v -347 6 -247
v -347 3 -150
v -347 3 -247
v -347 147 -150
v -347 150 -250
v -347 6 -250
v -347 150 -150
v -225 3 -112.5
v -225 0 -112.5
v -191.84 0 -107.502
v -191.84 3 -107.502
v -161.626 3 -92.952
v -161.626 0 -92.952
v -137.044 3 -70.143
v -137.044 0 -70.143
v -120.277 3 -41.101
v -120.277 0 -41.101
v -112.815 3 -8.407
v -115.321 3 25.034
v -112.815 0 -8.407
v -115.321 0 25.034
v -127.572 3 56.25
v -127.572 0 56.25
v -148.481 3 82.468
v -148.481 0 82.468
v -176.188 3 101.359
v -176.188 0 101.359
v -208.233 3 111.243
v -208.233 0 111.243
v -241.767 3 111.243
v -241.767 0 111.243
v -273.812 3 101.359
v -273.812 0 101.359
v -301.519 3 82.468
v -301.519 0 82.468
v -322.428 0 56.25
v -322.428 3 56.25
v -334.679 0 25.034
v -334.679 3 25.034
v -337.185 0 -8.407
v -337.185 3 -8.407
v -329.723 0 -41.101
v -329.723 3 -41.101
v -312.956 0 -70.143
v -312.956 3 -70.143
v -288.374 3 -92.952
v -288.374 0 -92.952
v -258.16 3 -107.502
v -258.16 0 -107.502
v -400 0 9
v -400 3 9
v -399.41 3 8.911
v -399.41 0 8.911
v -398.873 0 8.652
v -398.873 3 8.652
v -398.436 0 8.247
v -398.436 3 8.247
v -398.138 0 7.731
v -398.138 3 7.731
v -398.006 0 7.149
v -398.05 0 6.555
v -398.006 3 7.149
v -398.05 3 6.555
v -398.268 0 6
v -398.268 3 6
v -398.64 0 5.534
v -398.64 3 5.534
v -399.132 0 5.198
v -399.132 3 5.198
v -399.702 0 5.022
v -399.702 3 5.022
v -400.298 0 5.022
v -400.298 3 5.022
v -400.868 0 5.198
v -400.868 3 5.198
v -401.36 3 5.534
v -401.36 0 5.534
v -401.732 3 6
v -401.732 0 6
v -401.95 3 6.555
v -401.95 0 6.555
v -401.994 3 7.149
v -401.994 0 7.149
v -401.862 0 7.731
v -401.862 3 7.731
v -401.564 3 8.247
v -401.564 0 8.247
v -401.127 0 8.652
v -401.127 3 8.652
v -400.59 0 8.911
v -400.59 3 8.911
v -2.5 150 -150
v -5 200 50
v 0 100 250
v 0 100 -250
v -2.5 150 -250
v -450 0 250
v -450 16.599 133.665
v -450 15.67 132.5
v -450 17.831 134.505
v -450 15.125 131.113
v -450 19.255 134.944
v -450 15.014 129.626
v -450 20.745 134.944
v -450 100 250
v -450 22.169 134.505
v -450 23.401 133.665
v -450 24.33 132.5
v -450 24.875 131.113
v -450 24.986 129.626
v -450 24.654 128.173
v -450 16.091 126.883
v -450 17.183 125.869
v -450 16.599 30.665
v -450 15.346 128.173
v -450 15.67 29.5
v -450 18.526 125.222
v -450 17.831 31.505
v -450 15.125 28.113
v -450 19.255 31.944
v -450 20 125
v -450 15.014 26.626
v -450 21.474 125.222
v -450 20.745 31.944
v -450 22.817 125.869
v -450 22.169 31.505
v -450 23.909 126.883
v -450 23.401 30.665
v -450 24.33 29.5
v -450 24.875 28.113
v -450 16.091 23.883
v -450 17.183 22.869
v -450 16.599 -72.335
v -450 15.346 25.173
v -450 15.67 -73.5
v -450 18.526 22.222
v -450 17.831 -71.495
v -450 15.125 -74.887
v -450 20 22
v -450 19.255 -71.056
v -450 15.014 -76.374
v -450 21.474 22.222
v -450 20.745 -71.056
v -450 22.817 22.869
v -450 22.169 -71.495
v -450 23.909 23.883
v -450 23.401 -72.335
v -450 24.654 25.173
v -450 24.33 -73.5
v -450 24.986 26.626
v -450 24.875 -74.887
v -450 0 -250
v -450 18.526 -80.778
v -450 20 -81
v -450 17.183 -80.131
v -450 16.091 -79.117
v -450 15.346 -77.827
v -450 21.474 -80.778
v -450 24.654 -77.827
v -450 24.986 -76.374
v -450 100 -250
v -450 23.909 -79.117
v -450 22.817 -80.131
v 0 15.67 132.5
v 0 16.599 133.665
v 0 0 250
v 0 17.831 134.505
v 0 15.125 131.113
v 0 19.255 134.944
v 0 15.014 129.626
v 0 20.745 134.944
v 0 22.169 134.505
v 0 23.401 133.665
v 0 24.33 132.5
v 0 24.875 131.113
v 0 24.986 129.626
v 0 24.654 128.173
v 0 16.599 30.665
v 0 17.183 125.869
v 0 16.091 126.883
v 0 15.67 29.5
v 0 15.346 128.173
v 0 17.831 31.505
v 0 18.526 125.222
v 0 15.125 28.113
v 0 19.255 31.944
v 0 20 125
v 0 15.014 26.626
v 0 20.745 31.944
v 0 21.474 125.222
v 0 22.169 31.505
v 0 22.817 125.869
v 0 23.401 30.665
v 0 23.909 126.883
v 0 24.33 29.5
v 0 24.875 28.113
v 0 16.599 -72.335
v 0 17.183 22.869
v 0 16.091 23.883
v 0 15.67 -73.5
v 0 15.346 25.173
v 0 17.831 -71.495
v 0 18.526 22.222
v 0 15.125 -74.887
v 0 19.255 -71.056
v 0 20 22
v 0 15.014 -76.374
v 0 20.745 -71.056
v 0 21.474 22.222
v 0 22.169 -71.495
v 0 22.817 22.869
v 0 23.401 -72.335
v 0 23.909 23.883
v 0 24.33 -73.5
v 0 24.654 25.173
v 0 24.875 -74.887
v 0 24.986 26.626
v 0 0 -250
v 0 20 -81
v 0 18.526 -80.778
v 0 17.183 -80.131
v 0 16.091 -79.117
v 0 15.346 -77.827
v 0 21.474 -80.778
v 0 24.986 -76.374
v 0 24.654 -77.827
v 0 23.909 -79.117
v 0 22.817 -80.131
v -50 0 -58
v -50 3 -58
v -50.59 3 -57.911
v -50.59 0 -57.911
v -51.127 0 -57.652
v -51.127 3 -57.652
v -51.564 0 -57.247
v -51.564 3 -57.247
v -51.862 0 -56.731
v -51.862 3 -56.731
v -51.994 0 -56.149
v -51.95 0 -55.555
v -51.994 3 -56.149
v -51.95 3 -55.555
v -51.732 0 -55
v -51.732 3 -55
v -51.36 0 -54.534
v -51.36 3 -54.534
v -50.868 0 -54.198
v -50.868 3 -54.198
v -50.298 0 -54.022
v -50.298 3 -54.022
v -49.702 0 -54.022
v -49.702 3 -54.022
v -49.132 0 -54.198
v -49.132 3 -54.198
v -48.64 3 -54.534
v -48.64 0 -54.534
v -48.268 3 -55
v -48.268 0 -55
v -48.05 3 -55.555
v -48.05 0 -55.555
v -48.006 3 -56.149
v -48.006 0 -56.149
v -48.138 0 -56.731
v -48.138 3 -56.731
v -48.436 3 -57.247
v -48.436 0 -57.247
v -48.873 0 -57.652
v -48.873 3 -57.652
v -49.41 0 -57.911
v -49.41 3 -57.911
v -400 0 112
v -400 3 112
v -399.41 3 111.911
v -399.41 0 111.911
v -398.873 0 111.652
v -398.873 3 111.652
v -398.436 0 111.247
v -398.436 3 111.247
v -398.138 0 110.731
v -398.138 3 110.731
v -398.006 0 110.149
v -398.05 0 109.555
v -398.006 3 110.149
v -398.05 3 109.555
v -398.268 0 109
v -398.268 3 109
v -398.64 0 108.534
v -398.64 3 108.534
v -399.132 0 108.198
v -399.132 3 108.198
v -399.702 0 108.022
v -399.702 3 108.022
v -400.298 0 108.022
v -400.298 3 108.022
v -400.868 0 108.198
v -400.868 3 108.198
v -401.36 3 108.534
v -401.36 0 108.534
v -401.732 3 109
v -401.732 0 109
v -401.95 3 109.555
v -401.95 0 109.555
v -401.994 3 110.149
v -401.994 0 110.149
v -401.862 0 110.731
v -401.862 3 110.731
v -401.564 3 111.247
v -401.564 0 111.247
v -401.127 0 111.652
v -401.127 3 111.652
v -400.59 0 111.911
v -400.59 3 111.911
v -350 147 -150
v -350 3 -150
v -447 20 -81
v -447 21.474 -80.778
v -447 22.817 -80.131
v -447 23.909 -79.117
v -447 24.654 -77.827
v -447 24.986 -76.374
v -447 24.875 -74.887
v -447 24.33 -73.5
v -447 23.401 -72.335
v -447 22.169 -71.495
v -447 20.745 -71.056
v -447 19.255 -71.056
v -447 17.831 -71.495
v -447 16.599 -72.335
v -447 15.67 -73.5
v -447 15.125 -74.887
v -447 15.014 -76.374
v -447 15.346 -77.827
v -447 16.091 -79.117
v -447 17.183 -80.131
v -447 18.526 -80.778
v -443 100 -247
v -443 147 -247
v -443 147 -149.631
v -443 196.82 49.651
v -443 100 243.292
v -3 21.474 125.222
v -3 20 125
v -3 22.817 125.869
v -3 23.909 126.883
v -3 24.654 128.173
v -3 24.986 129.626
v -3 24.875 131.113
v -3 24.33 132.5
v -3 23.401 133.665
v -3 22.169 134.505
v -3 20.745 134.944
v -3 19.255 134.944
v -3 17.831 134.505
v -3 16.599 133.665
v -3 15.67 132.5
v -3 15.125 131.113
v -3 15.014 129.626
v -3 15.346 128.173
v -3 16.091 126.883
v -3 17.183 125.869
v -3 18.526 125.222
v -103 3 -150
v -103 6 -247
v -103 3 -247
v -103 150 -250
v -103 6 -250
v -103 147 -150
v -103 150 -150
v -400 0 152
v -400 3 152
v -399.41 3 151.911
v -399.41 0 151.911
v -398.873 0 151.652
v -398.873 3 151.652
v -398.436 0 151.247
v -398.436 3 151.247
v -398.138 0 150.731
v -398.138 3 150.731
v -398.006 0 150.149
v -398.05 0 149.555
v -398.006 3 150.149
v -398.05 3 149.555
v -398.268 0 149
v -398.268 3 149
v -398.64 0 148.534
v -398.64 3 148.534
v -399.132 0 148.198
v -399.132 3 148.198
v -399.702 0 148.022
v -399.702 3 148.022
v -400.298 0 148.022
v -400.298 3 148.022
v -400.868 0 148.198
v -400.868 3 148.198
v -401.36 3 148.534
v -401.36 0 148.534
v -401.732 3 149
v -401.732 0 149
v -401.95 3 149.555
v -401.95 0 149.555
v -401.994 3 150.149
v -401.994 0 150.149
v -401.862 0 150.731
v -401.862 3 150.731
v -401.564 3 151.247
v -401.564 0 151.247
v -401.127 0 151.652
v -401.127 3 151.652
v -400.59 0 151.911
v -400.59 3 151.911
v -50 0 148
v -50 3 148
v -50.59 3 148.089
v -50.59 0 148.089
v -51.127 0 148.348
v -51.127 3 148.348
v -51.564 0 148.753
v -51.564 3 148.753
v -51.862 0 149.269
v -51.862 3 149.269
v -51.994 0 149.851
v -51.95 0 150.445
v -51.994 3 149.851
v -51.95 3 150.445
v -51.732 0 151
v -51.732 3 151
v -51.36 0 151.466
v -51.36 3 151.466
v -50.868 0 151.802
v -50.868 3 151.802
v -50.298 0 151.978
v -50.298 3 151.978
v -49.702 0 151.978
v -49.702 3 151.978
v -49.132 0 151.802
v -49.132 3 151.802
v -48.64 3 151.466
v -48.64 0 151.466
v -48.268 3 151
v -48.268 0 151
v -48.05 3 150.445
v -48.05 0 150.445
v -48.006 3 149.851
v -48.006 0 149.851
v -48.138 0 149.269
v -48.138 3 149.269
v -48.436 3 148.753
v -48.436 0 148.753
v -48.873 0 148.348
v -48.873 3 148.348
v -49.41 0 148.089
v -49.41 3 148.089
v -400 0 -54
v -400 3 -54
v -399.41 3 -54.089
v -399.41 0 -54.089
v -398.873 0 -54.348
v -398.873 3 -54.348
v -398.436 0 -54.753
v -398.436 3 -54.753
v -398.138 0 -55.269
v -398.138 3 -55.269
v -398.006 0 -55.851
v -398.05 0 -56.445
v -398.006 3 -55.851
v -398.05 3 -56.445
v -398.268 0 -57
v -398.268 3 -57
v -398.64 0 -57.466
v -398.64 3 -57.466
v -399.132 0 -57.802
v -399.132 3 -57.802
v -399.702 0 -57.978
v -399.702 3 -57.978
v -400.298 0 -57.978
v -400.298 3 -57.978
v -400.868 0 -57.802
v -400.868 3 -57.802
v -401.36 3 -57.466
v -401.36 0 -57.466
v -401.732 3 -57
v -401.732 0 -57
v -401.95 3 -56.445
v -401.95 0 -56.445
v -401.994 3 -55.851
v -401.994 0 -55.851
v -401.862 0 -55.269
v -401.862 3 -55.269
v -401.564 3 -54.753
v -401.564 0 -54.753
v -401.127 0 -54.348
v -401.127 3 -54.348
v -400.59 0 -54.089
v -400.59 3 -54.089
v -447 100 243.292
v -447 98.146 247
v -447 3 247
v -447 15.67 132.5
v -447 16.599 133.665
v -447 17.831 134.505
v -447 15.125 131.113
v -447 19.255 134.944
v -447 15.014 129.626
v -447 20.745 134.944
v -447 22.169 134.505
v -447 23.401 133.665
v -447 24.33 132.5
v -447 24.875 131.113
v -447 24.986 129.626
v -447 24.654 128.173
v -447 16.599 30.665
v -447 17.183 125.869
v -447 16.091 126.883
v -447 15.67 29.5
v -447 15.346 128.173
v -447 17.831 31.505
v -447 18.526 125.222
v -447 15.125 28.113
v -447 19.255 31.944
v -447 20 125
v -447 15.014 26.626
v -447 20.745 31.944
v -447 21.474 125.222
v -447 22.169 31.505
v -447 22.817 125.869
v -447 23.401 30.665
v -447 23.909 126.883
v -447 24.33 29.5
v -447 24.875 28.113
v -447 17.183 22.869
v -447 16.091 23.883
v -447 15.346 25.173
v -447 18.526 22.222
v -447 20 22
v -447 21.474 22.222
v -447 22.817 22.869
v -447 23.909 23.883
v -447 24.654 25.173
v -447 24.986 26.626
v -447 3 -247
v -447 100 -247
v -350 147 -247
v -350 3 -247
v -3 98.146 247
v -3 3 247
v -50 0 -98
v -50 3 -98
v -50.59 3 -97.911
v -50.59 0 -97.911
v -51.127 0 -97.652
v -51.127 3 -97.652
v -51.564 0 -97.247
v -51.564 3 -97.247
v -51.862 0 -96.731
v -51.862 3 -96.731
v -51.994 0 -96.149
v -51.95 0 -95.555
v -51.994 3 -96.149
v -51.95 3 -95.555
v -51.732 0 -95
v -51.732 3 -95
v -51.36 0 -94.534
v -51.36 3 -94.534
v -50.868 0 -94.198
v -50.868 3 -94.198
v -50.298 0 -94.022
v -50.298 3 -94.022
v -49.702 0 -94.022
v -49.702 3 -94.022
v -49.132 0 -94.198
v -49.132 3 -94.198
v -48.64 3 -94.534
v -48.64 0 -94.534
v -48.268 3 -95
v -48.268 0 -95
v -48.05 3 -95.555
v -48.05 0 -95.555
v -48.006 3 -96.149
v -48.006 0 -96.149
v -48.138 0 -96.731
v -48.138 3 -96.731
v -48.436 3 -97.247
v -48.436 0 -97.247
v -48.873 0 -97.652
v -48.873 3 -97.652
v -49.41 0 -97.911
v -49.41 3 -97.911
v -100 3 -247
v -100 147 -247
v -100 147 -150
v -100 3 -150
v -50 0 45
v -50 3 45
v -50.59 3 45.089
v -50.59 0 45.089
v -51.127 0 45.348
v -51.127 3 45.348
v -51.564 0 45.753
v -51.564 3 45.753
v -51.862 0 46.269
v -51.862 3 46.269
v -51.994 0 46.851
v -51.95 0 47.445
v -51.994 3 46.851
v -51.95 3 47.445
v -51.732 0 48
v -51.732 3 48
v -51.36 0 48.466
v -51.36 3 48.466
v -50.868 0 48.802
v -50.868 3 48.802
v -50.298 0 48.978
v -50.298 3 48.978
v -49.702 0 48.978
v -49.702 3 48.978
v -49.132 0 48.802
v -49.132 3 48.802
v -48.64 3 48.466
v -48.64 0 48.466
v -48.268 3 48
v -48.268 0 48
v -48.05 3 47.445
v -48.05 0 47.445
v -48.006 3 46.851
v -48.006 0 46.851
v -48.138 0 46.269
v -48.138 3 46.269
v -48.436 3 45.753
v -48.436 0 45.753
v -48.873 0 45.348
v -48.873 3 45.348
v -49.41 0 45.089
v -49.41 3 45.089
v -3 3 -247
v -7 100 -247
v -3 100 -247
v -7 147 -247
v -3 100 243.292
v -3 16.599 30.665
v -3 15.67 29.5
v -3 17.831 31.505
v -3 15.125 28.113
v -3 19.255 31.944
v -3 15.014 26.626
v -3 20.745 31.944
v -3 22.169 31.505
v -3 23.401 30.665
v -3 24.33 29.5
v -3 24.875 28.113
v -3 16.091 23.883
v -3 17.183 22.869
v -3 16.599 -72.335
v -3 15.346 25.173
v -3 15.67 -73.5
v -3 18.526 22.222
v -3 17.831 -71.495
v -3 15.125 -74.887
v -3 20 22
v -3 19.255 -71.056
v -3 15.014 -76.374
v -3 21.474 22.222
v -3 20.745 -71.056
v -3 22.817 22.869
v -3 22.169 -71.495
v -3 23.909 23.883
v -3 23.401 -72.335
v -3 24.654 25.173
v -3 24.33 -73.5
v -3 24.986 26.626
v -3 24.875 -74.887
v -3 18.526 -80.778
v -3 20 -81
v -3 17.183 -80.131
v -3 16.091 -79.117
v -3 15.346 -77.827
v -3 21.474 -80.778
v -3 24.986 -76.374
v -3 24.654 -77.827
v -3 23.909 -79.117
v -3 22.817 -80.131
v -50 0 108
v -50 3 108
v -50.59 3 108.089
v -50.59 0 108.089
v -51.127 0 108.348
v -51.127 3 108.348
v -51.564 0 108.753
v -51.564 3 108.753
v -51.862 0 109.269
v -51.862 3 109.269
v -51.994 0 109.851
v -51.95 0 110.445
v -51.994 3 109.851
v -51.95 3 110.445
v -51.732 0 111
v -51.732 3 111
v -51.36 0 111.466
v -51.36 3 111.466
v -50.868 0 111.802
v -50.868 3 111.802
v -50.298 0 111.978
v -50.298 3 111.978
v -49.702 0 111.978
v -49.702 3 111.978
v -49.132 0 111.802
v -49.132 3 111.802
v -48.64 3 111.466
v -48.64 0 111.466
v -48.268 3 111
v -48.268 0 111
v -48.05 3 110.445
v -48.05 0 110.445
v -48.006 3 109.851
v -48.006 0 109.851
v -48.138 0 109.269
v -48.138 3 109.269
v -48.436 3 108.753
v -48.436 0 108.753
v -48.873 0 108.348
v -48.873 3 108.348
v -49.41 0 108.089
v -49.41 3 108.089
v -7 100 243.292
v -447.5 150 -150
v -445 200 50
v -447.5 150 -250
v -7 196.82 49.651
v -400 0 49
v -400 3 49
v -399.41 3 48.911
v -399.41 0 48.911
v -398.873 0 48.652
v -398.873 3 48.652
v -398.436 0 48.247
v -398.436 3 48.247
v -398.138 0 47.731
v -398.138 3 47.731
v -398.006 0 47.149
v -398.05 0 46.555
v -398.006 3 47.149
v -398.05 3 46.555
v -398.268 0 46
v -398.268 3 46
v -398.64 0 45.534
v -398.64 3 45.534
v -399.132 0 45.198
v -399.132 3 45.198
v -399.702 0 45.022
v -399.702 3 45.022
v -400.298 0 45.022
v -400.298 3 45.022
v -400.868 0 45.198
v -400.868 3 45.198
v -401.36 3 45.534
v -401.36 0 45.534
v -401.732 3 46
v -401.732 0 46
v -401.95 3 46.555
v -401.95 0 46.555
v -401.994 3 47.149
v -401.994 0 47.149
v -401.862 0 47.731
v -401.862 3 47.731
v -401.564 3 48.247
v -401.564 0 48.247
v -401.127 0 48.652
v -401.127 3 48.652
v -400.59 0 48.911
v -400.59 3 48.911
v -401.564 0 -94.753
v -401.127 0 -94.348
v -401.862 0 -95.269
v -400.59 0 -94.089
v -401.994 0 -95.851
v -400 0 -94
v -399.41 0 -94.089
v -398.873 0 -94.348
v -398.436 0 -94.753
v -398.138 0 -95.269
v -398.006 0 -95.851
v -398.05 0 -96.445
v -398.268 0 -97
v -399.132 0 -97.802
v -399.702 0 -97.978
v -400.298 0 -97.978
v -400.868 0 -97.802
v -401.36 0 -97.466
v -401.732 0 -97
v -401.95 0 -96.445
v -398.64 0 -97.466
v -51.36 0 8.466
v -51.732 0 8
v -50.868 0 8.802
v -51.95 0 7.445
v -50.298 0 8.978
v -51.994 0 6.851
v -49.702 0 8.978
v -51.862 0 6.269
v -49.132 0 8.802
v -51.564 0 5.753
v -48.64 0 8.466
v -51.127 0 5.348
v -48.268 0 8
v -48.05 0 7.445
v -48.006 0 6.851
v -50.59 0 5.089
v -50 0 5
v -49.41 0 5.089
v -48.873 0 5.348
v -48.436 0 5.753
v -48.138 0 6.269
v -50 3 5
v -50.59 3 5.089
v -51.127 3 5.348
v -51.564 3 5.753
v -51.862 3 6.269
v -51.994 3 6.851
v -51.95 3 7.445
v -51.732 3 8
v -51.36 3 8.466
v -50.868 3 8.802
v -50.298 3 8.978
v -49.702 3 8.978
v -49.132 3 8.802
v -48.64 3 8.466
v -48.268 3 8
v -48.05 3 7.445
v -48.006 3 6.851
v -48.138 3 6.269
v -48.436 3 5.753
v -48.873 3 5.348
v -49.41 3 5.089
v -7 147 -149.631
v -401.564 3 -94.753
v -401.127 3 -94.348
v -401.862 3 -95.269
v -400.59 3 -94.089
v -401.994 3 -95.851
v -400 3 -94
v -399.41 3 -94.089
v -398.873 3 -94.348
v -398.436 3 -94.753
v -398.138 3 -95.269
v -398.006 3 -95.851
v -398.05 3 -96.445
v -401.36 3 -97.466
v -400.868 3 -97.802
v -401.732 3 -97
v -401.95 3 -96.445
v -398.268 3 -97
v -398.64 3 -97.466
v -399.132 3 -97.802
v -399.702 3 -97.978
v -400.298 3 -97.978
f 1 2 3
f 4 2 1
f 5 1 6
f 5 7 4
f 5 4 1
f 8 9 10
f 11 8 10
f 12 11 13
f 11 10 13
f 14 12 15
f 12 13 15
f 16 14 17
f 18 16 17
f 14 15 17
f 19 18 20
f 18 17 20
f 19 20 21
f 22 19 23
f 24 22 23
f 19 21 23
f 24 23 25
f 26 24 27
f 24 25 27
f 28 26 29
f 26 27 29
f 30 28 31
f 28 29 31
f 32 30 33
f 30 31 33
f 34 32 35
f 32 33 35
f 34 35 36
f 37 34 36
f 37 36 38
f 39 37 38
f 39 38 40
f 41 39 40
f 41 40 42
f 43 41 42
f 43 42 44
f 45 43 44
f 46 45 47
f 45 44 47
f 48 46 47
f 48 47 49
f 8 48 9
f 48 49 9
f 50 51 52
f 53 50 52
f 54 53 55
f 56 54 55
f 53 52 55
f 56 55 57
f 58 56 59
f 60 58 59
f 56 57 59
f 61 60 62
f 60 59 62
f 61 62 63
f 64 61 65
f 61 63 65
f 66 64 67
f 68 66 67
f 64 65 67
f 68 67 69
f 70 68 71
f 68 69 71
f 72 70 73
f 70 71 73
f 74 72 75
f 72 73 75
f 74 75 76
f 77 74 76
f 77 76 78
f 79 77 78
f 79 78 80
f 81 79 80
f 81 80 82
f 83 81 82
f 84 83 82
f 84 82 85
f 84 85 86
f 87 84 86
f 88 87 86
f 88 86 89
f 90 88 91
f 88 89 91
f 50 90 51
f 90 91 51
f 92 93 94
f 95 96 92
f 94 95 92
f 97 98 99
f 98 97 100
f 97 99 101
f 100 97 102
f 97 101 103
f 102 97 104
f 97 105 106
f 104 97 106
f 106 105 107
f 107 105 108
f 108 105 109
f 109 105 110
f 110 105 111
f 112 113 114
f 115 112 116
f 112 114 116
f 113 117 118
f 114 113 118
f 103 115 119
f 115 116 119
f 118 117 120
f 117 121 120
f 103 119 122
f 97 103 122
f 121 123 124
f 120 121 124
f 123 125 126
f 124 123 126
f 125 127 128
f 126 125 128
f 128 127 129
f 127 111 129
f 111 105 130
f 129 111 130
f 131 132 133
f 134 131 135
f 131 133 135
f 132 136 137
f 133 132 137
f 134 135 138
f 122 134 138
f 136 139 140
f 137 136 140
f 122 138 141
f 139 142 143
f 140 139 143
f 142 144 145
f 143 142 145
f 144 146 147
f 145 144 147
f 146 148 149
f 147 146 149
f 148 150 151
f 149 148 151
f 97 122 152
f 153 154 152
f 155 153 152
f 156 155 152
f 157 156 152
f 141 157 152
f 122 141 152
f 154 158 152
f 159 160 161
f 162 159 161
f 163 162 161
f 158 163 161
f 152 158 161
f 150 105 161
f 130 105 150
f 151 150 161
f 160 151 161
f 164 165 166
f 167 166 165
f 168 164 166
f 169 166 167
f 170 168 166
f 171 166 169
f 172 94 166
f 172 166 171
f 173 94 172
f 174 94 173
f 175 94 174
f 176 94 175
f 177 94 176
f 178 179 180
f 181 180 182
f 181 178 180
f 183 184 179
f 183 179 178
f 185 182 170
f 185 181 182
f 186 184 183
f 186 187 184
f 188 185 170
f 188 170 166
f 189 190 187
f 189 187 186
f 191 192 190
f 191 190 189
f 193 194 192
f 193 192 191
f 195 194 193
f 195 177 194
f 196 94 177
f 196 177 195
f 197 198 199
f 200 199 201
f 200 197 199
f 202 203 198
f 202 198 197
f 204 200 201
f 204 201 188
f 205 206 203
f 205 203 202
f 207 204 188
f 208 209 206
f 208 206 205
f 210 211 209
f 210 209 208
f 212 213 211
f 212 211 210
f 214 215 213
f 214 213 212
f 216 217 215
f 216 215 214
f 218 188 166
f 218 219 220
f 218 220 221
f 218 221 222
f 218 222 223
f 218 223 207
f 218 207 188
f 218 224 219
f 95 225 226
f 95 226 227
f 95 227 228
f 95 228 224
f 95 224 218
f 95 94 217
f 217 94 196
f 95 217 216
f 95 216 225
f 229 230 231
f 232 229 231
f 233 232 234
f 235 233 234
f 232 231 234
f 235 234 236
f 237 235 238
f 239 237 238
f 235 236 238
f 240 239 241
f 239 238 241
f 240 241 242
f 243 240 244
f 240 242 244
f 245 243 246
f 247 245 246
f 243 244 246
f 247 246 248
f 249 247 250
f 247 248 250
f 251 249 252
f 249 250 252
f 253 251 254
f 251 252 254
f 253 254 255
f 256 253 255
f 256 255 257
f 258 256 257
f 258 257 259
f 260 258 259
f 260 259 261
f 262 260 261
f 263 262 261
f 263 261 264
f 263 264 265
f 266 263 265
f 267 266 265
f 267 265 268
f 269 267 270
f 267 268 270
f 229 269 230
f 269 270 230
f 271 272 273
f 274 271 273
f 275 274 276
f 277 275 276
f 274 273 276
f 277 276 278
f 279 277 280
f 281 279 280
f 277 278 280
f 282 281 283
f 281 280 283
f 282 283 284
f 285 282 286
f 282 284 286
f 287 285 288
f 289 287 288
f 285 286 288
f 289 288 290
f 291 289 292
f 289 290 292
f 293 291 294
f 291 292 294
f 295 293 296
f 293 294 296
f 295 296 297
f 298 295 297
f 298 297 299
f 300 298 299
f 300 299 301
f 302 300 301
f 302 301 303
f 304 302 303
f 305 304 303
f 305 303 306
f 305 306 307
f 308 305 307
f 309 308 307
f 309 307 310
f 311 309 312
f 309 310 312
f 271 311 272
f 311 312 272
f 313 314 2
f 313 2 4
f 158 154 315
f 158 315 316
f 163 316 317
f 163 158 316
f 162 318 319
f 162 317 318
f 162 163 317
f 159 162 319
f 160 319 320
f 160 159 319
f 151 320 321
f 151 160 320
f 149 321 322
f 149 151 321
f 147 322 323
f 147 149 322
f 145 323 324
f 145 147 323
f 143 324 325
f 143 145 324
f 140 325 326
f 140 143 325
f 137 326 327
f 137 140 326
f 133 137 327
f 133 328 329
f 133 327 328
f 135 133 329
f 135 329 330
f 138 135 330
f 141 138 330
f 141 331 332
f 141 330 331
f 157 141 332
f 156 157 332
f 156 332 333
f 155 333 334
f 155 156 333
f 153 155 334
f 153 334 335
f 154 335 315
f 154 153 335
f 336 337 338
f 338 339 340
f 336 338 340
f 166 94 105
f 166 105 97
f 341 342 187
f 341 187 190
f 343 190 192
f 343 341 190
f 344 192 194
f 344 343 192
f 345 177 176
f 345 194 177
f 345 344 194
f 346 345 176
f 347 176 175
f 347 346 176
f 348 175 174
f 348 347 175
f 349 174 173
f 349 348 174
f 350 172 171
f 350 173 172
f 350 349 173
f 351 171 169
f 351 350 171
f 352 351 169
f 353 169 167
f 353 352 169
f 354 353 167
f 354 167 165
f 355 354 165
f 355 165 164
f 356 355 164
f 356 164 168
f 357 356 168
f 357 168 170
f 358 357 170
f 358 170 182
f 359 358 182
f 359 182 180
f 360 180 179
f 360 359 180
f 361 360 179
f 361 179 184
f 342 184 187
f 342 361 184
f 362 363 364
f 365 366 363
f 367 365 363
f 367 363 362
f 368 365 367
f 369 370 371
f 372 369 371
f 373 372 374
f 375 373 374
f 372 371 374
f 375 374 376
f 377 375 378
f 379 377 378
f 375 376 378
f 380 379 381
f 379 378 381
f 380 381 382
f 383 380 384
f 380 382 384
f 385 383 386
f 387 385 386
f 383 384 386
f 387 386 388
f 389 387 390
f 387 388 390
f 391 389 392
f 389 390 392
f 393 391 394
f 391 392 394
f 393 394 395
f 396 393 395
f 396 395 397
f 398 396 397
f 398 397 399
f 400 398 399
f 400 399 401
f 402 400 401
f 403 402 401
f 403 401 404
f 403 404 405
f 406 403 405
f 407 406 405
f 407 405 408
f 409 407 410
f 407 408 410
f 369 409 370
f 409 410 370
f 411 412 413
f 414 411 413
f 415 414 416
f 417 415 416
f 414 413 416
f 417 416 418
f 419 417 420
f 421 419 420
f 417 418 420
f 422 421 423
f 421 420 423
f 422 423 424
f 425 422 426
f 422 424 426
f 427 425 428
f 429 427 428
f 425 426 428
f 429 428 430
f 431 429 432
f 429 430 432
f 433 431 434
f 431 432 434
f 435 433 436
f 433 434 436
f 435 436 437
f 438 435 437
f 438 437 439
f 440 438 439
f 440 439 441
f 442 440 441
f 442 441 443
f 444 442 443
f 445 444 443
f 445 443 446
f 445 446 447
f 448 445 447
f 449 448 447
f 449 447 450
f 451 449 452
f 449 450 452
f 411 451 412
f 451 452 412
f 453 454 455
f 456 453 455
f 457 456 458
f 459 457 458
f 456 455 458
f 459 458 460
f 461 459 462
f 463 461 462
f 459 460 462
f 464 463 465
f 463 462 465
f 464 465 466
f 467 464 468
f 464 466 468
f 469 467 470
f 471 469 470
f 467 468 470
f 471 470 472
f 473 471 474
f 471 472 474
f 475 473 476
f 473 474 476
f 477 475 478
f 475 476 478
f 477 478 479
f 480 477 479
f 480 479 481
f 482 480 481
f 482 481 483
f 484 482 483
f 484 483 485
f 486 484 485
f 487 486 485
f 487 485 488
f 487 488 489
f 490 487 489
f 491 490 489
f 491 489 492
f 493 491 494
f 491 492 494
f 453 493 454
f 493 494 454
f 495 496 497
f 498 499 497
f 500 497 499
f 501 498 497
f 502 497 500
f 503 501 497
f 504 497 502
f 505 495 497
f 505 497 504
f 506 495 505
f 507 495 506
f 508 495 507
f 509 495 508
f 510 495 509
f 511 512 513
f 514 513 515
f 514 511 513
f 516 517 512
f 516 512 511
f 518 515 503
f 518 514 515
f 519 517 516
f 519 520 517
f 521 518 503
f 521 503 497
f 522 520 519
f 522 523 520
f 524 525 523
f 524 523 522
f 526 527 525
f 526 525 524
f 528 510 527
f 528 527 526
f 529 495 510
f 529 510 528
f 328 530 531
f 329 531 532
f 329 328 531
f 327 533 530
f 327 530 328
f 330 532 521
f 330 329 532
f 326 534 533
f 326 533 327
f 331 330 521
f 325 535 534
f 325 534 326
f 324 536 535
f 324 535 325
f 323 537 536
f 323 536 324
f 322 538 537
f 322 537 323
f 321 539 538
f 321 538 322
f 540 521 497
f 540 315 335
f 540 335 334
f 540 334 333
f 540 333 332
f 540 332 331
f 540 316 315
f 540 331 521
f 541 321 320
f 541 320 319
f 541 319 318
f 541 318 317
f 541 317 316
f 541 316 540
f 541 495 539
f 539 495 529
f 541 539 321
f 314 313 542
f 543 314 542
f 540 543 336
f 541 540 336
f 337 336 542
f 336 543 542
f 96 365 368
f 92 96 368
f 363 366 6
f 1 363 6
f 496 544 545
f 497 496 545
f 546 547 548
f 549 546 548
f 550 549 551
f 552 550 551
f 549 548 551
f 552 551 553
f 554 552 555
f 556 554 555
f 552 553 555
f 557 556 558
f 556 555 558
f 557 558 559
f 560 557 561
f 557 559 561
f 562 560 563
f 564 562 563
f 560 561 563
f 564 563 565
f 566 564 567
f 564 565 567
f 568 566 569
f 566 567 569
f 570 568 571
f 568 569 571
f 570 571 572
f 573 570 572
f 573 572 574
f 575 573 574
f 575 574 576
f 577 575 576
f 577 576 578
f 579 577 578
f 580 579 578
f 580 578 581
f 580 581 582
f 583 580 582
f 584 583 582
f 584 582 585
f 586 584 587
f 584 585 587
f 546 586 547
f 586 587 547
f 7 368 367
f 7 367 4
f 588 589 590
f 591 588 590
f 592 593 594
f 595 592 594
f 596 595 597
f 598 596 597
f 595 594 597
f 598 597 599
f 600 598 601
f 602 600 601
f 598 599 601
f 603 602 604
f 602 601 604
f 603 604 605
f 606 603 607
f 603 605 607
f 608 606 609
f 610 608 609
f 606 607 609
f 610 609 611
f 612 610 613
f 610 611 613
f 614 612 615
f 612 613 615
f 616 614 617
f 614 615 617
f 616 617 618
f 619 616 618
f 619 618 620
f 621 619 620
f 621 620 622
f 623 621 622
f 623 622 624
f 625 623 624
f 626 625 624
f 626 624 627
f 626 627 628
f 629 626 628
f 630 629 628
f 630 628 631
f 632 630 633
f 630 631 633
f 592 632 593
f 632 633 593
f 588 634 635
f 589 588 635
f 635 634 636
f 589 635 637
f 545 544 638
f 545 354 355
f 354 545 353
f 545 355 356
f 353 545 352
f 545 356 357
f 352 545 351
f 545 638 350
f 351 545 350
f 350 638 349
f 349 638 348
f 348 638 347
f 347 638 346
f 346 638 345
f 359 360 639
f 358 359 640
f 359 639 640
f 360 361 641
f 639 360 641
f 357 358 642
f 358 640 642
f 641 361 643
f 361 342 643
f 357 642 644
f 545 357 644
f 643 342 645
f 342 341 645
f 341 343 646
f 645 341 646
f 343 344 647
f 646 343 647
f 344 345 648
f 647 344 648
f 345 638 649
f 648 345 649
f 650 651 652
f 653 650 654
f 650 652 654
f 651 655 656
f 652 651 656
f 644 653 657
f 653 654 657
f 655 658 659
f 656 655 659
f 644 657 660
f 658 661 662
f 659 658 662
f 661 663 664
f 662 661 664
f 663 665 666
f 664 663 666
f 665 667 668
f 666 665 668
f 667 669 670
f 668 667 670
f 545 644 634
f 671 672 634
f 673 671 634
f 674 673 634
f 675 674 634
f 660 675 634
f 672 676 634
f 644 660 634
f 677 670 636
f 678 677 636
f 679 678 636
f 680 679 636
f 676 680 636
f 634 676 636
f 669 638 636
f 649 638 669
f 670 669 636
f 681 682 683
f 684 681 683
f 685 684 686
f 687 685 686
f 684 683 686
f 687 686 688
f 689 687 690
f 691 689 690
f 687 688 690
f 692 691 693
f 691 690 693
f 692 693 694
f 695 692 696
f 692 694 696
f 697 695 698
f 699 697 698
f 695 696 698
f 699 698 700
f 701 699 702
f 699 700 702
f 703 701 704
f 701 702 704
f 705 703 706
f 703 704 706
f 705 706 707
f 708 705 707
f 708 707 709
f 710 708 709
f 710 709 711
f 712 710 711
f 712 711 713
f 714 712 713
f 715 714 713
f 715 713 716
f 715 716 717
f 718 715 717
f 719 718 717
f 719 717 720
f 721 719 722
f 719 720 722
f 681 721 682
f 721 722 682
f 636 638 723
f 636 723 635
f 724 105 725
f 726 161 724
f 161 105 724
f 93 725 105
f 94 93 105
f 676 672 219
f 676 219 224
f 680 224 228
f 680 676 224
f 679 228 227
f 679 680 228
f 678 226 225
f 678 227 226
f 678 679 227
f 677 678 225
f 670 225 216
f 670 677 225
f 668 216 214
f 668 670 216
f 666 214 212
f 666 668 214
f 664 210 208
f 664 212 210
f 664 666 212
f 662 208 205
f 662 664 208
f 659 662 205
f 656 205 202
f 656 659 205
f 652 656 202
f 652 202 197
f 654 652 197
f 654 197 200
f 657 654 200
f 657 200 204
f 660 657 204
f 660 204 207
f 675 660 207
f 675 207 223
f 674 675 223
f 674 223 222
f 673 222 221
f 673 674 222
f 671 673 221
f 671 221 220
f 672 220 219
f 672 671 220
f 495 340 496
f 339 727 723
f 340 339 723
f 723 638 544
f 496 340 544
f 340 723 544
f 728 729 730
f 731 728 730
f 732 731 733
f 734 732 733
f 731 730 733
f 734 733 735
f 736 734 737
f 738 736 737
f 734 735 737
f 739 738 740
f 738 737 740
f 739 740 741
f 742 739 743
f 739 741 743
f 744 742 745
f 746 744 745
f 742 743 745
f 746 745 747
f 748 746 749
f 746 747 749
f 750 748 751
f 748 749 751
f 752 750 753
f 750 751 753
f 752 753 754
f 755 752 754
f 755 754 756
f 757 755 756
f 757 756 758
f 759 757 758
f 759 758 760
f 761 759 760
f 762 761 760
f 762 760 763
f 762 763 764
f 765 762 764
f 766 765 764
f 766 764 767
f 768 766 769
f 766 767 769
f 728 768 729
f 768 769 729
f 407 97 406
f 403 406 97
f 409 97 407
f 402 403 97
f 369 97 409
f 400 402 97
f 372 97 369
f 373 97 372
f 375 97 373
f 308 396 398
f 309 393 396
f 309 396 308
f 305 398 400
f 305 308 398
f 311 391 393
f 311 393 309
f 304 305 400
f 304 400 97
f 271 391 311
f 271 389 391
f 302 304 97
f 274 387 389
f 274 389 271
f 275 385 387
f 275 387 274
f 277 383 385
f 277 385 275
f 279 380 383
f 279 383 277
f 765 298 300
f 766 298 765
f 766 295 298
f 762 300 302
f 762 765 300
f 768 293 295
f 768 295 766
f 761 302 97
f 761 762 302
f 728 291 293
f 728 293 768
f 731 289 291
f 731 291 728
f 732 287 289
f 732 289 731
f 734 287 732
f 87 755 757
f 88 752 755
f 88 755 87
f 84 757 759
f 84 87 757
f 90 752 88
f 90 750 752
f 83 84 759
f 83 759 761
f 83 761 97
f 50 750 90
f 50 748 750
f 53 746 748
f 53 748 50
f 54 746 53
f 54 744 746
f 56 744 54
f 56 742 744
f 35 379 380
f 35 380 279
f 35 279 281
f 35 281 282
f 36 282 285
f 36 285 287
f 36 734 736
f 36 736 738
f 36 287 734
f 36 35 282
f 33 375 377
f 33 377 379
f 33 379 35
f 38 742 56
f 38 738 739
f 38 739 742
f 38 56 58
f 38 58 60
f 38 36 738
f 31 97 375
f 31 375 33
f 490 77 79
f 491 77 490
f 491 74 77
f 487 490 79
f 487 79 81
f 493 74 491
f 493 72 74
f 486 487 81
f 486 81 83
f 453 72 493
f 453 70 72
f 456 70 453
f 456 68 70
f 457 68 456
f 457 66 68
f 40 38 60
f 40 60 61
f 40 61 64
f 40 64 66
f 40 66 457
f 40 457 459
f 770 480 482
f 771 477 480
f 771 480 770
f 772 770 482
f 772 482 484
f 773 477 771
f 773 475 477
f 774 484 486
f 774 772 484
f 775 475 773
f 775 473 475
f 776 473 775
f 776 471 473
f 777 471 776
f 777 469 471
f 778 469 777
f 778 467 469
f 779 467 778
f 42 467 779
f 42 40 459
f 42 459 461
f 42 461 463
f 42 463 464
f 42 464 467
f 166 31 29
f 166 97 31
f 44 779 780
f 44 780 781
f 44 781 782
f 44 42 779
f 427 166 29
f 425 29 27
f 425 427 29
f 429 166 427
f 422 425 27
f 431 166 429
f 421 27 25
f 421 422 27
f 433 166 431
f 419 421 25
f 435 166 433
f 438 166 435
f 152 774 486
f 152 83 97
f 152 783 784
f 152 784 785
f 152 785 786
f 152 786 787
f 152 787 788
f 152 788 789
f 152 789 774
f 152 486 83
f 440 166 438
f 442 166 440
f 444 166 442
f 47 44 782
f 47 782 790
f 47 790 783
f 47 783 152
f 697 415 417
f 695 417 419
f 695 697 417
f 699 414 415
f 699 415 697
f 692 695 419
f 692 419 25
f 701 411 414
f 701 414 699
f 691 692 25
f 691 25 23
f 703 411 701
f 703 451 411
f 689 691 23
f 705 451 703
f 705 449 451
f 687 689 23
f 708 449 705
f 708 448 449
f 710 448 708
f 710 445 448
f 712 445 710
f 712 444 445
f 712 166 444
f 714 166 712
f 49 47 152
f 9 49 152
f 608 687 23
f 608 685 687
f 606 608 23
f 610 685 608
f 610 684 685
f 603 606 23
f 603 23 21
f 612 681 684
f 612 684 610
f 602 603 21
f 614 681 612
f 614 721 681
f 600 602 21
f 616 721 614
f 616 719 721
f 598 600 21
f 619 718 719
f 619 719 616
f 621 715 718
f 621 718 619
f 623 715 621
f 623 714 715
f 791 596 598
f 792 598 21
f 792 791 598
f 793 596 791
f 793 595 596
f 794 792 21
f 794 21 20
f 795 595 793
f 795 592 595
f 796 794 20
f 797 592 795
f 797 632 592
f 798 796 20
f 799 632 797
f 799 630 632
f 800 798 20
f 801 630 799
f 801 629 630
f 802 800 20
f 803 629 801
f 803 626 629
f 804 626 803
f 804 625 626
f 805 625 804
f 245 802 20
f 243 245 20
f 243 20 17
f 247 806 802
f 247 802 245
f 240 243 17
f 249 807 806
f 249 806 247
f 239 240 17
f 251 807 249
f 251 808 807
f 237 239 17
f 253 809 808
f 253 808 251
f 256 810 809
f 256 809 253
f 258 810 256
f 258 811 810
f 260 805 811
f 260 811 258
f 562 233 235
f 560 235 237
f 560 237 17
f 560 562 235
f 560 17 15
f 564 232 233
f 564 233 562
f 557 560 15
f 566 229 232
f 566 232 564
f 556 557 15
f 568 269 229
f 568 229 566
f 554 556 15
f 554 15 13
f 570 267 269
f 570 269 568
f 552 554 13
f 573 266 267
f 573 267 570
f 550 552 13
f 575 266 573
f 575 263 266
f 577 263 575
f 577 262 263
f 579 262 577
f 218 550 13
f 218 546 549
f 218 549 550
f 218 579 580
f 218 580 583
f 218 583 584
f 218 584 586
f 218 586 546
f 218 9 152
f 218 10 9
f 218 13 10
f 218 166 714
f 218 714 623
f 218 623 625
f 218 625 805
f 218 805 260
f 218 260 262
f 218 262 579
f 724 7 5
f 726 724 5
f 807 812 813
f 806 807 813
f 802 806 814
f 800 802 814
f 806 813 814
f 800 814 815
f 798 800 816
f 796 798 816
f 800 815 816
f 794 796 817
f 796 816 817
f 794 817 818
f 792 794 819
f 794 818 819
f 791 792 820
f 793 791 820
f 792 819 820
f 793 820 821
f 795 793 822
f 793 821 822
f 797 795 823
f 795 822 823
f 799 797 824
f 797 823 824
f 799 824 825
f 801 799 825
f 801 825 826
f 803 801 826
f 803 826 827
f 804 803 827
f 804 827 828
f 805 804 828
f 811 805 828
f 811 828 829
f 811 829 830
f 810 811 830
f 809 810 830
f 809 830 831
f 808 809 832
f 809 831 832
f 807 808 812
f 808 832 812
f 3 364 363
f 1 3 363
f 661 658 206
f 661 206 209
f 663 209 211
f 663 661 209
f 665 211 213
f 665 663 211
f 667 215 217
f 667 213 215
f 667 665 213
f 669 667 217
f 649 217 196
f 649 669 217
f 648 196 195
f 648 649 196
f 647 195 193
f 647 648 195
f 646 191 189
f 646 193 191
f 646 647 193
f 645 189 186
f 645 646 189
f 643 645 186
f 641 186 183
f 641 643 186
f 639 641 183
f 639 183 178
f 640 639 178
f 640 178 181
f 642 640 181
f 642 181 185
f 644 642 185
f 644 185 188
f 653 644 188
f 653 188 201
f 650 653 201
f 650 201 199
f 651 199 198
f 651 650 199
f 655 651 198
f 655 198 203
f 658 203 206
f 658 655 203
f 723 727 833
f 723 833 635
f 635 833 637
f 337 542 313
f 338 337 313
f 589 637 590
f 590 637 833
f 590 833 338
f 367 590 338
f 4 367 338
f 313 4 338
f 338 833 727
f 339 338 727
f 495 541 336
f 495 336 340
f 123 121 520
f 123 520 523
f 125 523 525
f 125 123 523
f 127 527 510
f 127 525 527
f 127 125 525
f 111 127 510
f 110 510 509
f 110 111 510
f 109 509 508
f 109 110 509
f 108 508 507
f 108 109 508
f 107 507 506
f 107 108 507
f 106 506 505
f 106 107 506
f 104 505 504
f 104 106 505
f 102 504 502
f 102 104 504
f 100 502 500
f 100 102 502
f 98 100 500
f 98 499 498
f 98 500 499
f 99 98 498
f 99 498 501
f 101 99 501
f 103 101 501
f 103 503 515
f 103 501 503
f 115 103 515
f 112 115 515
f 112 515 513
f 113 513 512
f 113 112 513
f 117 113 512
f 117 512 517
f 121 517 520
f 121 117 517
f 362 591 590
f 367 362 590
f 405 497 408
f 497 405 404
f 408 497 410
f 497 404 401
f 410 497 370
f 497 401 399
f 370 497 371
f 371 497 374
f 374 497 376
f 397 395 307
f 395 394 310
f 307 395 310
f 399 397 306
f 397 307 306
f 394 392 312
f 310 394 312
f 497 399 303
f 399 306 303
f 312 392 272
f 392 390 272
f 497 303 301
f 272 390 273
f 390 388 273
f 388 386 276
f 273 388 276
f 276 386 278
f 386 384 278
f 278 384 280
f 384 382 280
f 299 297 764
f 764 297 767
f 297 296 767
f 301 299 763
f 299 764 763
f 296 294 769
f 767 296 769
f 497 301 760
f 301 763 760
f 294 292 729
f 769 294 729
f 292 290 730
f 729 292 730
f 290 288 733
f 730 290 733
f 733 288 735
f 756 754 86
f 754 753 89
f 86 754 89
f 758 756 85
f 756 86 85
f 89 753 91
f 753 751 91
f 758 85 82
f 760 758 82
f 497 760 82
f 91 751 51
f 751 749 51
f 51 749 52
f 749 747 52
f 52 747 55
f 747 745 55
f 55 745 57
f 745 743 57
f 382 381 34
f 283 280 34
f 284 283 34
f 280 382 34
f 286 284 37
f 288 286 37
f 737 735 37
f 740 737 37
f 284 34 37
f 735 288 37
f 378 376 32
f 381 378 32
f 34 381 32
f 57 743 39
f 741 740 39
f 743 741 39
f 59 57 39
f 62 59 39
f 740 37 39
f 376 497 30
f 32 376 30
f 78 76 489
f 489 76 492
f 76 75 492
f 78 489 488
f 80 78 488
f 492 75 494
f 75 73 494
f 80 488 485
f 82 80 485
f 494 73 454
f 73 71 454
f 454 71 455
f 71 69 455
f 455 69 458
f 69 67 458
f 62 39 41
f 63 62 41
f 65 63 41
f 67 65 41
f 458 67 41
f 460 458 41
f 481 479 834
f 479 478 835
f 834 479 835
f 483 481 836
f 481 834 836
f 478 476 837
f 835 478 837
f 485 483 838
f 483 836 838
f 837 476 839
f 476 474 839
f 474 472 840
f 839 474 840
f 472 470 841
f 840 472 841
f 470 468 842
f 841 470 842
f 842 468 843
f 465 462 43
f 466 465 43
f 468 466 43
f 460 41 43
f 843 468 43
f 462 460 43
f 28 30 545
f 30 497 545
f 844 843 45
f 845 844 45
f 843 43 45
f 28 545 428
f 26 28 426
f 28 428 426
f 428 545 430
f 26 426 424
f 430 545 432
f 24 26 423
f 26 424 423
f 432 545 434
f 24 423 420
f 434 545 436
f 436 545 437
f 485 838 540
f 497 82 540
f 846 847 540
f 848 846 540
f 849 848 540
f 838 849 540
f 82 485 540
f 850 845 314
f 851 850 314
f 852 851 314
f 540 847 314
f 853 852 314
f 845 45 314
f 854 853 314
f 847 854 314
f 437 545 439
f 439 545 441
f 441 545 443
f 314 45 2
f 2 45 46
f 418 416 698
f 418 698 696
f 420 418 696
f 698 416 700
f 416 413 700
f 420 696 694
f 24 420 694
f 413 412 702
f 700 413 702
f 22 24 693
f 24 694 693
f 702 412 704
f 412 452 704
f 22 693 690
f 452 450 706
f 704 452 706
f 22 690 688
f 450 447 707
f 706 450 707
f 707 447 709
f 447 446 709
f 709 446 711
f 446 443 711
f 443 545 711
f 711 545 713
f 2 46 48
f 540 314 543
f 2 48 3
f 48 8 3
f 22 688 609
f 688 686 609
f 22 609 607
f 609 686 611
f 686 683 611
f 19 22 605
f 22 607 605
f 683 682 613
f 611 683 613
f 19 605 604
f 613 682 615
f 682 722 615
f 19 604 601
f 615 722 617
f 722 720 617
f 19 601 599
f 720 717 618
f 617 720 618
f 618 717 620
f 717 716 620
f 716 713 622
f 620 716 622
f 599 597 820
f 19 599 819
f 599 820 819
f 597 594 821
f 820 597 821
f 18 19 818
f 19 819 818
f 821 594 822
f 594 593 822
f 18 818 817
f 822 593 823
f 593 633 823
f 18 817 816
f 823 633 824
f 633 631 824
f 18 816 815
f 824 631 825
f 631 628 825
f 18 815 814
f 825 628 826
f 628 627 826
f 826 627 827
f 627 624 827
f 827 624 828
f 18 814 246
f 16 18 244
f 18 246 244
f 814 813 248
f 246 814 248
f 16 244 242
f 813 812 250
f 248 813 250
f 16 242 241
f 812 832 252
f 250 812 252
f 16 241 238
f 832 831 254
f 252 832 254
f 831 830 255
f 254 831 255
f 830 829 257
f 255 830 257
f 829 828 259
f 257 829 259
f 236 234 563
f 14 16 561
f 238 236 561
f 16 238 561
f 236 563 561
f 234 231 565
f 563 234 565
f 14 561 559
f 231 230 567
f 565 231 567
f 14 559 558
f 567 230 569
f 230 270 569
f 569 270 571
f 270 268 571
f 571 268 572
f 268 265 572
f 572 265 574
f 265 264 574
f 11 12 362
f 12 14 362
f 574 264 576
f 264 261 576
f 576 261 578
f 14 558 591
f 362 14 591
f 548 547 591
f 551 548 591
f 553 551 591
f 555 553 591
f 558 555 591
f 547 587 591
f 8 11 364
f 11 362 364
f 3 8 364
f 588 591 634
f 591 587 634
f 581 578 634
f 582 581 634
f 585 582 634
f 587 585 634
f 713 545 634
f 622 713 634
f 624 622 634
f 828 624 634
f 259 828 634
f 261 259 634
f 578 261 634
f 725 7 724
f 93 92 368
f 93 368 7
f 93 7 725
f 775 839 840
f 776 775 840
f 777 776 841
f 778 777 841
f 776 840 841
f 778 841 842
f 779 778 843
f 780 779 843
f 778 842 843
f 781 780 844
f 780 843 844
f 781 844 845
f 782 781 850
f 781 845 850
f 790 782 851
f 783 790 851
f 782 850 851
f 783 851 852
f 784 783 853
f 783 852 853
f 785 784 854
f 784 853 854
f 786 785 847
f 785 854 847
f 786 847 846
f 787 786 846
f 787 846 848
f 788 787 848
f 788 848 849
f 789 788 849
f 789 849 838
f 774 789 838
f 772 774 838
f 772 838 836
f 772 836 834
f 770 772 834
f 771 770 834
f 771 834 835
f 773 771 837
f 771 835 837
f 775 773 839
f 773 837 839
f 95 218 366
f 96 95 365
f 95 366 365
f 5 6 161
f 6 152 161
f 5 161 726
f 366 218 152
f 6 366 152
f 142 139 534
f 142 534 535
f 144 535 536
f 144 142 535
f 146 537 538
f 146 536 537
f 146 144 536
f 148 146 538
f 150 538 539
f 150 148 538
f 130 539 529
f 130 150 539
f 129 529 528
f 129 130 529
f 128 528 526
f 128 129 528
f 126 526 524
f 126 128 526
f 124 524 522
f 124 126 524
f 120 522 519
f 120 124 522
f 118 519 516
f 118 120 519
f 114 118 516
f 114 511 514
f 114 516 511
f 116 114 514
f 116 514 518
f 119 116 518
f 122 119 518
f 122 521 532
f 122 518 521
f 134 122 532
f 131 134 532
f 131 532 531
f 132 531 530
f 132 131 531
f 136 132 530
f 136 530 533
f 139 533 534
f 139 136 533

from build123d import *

# Parameters (mm, degrees)
BOSS_EXTRUDE1_DEPTH     = 450
CUT_EXTRUDE1_START      = -3
CUT_EXTRUDE1_DEPTH      = 444
SKETCH4_W               = 250
SKETCH4_H               = 144
CUT_EXTRUDE2_DEPTH      = 100
SKETCH5_R               = 112.5
CUT_EXTRUDE3_DEPTH      = 3
CUT_EXTRUDE5_DEPTH      = 553.268050859
CUT_EXTRUDE5_DEPTH_BACK = 553.268050859
SKETCH7_R               = 5
BOSS_EXTRUDE2_DEPTH     = 7
BOSS_EXTRUDE3_DEPTH     = 7
CUT_EXTRUDE7_DEPTH      = 702.783442381
CUT_EXTRUDE7_DEPTH_BACK = 702.783442381
SKETCH12_W              = 100
SKETCH12_H              = 147.055014966
BOSS_EXTRUDE4_DEPTH     = 3
SKETCH14_W              = 100
SKETCH14_H              = 147
BOSS_EXTRUDE5_DEPTH     = 3
SKETCH15_R              = 2
CUT_EXTRUDE8_DEPTH      = 3


with BuildPart() as part:
    # Sketch2 → Boss-Extrude1 (new body)
    with BuildSketch(Plane(origin=(0, 0, 0), x_dir=(0, 0, -1), z_dir=(1, 0, 0))):
        Polygon((-250, 0), (250, 0), (250, 150), (150, 150), (-50, 200), (-250, 100), align=None)
    extrude(amount=-BOSS_EXTRUDE1_DEPTH)

    # Sketch3 → Cut-Extrude1 (cut)
    with BuildSketch(Plane(origin=(0, 0, 0), x_dir=(0, 0, -1), z_dir=(1, 0, 0)).offset(CUT_EXTRUDE1_START)):
        Polygon((-247, 98.145898034), (-247, 3), (247, 3), (247, 147), (149.630683123, 147), (-49.650969671, 196.820413198), align=None)
    extrude(amount=-CUT_EXTRUDE1_DEPTH, mode=Mode.SUBTRACT)

    # Sketch4 → Cut-Extrude2 (cut)
    with BuildSketch(Plane(origin=(0, 0, -250), x_dir=(-1, 0, 0), z_dir=(0, 0, -1))):
        with Locations((225, 78)):
            Rectangle(SKETCH4_W, SKETCH4_H)
    extrude(amount=-CUT_EXTRUDE2_DEPTH, mode=Mode.SUBTRACT)

    # Sketch5 → Cut-Extrude3 (cut)
    with BuildSketch(Plane.XZ):
        with Locations(Location((-225, 0, 0), (0, 0, 270))):
            Circle(SKETCH5_R)
    extrude(amount=-CUT_EXTRUDE3_DEPTH, mode=Mode.SUBTRACT)

    # Sketch7 → Cut-Extrude5 (cut, two sides: drawn at the far end of the back side and taken through both)
    with BuildSketch(Plane(origin=(0, 0, 0), x_dir=(0, 0, -1), z_dir=(1, 0, 0)).offset(-CUT_EXTRUDE5_DEPTH_BACK)):
        with Locations((-130, 20)):
            Circle(SKETCH7_R)
        with Locations((-27, 20)):
            Circle(SKETCH7_R)
        with Locations((76, 20)):
            Circle(SKETCH7_R)
    extrude(amount=CUT_EXTRUDE5_DEPTH + CUT_EXTRUDE5_DEPTH_BACK, mode=Mode.SUBTRACT)

    # Sketch9 → Boss-Extrude2 (add)
    with BuildSketch(Plane(origin=(0, 0, 0), x_dir=(0, 0, -1), z_dir=(1, 0, 0))):
        Polygon((-250, 100), (250, 100), (250, 150), (150, 150), (-50, 200), align=None)
    extrude(amount=-BOSS_EXTRUDE2_DEPTH)

    # Sketch10 → Boss-Extrude3 (add)
    with BuildSketch(Plane.ZY.offset(450)):
        Polygon((250, 100), (50, 200), (-150, 150), (-250, 150), (-250, 100), align=None)
    extrude(amount=-BOSS_EXTRUDE3_DEPTH)

    # Sketch11 → Cut-Extrude7 (cut, two sides: drawn at the far end of the back side and taken through both)
    with BuildSketch(Plane.XY.offset(250).offset(-CUT_EXTRUDE7_DEPTH_BACK)):
        Polygon((0, 100), (0, 200), (-5, 200), align=None)
        Polygon((-450, 200), (-450, 100), (-445, 200), align=None)
    extrude(amount=CUT_EXTRUDE7_DEPTH + CUT_EXTRUDE7_DEPTH_BACK, mode=Mode.SUBTRACT)

    # Sketch12 → Boss-Extrude4 (add)
    with BuildSketch(Plane.ZY.offset(100)):
        with Locations((-200, 76.472492517)):
            Rectangle(SKETCH12_W, SKETCH12_H)
    extrude(amount=BOSS_EXTRUDE4_DEPTH)

    # Sketch14 → Boss-Extrude5 (add)
    with BuildSketch(Plane(origin=(-350, 0, 0), x_dir=(0, 0, -1), z_dir=(1, 0, 0))):
        with Locations((200, 76.5)):
            Rectangle(SKETCH14_W, SKETCH14_H)
    extrude(amount=BOSS_EXTRUDE5_DEPTH)

    # Sketch15 → Cut-Extrude8 (cut)
    with BuildSketch(Plane(origin=(0, 3, 0), x_dir=(1, 0, 0), z_dir=(0, 1, 0))):
        with Locations(Location((-400, 96, 0), (0, 0, 270))):
            Circle(SKETCH15_R)
        with Locations(Location((-400, 56, 0), (0, 0, 270))):
            Circle(SKETCH15_R)
        with Locations(Location((-400, -7, 0), (0, 0, 270))):
            Circle(SKETCH15_R)
        with Locations(Location((-400, -47, 0), (0, 0, 270))):
            Circle(SKETCH15_R)
        with Locations(Location((-400, -110, 0), (0, 0, 270))):
            Circle(SKETCH15_R)
        with Locations(Location((-400, -150, 0), (0, 0, 270))):
            Circle(SKETCH15_R)
        with Locations(Location((-50, -150, 0), (0, 0, 90))):
            Circle(SKETCH15_R)
        with Locations(Location((-50, -110, 0), (0, 0, 90))):
            Circle(SKETCH15_R)
        with Locations(Location((-50, -47, 0), (0, 0, 90))):
            Circle(SKETCH15_R)
        with Locations(Location((-50, -7, 0), (0, 0, 90))):
            Circle(SKETCH15_R)
        with Locations(Location((-50, 56, 0), (0, 0, 90))):
            Circle(SKETCH15_R)
        with Locations(Location((-50, 96, 0), (0, 0, 90))):
            Circle(SKETCH15_R)
    extrude(amount=-CUT_EXTRUDE8_DEPTH, mode=Mode.SUBTRACT)


solid = part.part
